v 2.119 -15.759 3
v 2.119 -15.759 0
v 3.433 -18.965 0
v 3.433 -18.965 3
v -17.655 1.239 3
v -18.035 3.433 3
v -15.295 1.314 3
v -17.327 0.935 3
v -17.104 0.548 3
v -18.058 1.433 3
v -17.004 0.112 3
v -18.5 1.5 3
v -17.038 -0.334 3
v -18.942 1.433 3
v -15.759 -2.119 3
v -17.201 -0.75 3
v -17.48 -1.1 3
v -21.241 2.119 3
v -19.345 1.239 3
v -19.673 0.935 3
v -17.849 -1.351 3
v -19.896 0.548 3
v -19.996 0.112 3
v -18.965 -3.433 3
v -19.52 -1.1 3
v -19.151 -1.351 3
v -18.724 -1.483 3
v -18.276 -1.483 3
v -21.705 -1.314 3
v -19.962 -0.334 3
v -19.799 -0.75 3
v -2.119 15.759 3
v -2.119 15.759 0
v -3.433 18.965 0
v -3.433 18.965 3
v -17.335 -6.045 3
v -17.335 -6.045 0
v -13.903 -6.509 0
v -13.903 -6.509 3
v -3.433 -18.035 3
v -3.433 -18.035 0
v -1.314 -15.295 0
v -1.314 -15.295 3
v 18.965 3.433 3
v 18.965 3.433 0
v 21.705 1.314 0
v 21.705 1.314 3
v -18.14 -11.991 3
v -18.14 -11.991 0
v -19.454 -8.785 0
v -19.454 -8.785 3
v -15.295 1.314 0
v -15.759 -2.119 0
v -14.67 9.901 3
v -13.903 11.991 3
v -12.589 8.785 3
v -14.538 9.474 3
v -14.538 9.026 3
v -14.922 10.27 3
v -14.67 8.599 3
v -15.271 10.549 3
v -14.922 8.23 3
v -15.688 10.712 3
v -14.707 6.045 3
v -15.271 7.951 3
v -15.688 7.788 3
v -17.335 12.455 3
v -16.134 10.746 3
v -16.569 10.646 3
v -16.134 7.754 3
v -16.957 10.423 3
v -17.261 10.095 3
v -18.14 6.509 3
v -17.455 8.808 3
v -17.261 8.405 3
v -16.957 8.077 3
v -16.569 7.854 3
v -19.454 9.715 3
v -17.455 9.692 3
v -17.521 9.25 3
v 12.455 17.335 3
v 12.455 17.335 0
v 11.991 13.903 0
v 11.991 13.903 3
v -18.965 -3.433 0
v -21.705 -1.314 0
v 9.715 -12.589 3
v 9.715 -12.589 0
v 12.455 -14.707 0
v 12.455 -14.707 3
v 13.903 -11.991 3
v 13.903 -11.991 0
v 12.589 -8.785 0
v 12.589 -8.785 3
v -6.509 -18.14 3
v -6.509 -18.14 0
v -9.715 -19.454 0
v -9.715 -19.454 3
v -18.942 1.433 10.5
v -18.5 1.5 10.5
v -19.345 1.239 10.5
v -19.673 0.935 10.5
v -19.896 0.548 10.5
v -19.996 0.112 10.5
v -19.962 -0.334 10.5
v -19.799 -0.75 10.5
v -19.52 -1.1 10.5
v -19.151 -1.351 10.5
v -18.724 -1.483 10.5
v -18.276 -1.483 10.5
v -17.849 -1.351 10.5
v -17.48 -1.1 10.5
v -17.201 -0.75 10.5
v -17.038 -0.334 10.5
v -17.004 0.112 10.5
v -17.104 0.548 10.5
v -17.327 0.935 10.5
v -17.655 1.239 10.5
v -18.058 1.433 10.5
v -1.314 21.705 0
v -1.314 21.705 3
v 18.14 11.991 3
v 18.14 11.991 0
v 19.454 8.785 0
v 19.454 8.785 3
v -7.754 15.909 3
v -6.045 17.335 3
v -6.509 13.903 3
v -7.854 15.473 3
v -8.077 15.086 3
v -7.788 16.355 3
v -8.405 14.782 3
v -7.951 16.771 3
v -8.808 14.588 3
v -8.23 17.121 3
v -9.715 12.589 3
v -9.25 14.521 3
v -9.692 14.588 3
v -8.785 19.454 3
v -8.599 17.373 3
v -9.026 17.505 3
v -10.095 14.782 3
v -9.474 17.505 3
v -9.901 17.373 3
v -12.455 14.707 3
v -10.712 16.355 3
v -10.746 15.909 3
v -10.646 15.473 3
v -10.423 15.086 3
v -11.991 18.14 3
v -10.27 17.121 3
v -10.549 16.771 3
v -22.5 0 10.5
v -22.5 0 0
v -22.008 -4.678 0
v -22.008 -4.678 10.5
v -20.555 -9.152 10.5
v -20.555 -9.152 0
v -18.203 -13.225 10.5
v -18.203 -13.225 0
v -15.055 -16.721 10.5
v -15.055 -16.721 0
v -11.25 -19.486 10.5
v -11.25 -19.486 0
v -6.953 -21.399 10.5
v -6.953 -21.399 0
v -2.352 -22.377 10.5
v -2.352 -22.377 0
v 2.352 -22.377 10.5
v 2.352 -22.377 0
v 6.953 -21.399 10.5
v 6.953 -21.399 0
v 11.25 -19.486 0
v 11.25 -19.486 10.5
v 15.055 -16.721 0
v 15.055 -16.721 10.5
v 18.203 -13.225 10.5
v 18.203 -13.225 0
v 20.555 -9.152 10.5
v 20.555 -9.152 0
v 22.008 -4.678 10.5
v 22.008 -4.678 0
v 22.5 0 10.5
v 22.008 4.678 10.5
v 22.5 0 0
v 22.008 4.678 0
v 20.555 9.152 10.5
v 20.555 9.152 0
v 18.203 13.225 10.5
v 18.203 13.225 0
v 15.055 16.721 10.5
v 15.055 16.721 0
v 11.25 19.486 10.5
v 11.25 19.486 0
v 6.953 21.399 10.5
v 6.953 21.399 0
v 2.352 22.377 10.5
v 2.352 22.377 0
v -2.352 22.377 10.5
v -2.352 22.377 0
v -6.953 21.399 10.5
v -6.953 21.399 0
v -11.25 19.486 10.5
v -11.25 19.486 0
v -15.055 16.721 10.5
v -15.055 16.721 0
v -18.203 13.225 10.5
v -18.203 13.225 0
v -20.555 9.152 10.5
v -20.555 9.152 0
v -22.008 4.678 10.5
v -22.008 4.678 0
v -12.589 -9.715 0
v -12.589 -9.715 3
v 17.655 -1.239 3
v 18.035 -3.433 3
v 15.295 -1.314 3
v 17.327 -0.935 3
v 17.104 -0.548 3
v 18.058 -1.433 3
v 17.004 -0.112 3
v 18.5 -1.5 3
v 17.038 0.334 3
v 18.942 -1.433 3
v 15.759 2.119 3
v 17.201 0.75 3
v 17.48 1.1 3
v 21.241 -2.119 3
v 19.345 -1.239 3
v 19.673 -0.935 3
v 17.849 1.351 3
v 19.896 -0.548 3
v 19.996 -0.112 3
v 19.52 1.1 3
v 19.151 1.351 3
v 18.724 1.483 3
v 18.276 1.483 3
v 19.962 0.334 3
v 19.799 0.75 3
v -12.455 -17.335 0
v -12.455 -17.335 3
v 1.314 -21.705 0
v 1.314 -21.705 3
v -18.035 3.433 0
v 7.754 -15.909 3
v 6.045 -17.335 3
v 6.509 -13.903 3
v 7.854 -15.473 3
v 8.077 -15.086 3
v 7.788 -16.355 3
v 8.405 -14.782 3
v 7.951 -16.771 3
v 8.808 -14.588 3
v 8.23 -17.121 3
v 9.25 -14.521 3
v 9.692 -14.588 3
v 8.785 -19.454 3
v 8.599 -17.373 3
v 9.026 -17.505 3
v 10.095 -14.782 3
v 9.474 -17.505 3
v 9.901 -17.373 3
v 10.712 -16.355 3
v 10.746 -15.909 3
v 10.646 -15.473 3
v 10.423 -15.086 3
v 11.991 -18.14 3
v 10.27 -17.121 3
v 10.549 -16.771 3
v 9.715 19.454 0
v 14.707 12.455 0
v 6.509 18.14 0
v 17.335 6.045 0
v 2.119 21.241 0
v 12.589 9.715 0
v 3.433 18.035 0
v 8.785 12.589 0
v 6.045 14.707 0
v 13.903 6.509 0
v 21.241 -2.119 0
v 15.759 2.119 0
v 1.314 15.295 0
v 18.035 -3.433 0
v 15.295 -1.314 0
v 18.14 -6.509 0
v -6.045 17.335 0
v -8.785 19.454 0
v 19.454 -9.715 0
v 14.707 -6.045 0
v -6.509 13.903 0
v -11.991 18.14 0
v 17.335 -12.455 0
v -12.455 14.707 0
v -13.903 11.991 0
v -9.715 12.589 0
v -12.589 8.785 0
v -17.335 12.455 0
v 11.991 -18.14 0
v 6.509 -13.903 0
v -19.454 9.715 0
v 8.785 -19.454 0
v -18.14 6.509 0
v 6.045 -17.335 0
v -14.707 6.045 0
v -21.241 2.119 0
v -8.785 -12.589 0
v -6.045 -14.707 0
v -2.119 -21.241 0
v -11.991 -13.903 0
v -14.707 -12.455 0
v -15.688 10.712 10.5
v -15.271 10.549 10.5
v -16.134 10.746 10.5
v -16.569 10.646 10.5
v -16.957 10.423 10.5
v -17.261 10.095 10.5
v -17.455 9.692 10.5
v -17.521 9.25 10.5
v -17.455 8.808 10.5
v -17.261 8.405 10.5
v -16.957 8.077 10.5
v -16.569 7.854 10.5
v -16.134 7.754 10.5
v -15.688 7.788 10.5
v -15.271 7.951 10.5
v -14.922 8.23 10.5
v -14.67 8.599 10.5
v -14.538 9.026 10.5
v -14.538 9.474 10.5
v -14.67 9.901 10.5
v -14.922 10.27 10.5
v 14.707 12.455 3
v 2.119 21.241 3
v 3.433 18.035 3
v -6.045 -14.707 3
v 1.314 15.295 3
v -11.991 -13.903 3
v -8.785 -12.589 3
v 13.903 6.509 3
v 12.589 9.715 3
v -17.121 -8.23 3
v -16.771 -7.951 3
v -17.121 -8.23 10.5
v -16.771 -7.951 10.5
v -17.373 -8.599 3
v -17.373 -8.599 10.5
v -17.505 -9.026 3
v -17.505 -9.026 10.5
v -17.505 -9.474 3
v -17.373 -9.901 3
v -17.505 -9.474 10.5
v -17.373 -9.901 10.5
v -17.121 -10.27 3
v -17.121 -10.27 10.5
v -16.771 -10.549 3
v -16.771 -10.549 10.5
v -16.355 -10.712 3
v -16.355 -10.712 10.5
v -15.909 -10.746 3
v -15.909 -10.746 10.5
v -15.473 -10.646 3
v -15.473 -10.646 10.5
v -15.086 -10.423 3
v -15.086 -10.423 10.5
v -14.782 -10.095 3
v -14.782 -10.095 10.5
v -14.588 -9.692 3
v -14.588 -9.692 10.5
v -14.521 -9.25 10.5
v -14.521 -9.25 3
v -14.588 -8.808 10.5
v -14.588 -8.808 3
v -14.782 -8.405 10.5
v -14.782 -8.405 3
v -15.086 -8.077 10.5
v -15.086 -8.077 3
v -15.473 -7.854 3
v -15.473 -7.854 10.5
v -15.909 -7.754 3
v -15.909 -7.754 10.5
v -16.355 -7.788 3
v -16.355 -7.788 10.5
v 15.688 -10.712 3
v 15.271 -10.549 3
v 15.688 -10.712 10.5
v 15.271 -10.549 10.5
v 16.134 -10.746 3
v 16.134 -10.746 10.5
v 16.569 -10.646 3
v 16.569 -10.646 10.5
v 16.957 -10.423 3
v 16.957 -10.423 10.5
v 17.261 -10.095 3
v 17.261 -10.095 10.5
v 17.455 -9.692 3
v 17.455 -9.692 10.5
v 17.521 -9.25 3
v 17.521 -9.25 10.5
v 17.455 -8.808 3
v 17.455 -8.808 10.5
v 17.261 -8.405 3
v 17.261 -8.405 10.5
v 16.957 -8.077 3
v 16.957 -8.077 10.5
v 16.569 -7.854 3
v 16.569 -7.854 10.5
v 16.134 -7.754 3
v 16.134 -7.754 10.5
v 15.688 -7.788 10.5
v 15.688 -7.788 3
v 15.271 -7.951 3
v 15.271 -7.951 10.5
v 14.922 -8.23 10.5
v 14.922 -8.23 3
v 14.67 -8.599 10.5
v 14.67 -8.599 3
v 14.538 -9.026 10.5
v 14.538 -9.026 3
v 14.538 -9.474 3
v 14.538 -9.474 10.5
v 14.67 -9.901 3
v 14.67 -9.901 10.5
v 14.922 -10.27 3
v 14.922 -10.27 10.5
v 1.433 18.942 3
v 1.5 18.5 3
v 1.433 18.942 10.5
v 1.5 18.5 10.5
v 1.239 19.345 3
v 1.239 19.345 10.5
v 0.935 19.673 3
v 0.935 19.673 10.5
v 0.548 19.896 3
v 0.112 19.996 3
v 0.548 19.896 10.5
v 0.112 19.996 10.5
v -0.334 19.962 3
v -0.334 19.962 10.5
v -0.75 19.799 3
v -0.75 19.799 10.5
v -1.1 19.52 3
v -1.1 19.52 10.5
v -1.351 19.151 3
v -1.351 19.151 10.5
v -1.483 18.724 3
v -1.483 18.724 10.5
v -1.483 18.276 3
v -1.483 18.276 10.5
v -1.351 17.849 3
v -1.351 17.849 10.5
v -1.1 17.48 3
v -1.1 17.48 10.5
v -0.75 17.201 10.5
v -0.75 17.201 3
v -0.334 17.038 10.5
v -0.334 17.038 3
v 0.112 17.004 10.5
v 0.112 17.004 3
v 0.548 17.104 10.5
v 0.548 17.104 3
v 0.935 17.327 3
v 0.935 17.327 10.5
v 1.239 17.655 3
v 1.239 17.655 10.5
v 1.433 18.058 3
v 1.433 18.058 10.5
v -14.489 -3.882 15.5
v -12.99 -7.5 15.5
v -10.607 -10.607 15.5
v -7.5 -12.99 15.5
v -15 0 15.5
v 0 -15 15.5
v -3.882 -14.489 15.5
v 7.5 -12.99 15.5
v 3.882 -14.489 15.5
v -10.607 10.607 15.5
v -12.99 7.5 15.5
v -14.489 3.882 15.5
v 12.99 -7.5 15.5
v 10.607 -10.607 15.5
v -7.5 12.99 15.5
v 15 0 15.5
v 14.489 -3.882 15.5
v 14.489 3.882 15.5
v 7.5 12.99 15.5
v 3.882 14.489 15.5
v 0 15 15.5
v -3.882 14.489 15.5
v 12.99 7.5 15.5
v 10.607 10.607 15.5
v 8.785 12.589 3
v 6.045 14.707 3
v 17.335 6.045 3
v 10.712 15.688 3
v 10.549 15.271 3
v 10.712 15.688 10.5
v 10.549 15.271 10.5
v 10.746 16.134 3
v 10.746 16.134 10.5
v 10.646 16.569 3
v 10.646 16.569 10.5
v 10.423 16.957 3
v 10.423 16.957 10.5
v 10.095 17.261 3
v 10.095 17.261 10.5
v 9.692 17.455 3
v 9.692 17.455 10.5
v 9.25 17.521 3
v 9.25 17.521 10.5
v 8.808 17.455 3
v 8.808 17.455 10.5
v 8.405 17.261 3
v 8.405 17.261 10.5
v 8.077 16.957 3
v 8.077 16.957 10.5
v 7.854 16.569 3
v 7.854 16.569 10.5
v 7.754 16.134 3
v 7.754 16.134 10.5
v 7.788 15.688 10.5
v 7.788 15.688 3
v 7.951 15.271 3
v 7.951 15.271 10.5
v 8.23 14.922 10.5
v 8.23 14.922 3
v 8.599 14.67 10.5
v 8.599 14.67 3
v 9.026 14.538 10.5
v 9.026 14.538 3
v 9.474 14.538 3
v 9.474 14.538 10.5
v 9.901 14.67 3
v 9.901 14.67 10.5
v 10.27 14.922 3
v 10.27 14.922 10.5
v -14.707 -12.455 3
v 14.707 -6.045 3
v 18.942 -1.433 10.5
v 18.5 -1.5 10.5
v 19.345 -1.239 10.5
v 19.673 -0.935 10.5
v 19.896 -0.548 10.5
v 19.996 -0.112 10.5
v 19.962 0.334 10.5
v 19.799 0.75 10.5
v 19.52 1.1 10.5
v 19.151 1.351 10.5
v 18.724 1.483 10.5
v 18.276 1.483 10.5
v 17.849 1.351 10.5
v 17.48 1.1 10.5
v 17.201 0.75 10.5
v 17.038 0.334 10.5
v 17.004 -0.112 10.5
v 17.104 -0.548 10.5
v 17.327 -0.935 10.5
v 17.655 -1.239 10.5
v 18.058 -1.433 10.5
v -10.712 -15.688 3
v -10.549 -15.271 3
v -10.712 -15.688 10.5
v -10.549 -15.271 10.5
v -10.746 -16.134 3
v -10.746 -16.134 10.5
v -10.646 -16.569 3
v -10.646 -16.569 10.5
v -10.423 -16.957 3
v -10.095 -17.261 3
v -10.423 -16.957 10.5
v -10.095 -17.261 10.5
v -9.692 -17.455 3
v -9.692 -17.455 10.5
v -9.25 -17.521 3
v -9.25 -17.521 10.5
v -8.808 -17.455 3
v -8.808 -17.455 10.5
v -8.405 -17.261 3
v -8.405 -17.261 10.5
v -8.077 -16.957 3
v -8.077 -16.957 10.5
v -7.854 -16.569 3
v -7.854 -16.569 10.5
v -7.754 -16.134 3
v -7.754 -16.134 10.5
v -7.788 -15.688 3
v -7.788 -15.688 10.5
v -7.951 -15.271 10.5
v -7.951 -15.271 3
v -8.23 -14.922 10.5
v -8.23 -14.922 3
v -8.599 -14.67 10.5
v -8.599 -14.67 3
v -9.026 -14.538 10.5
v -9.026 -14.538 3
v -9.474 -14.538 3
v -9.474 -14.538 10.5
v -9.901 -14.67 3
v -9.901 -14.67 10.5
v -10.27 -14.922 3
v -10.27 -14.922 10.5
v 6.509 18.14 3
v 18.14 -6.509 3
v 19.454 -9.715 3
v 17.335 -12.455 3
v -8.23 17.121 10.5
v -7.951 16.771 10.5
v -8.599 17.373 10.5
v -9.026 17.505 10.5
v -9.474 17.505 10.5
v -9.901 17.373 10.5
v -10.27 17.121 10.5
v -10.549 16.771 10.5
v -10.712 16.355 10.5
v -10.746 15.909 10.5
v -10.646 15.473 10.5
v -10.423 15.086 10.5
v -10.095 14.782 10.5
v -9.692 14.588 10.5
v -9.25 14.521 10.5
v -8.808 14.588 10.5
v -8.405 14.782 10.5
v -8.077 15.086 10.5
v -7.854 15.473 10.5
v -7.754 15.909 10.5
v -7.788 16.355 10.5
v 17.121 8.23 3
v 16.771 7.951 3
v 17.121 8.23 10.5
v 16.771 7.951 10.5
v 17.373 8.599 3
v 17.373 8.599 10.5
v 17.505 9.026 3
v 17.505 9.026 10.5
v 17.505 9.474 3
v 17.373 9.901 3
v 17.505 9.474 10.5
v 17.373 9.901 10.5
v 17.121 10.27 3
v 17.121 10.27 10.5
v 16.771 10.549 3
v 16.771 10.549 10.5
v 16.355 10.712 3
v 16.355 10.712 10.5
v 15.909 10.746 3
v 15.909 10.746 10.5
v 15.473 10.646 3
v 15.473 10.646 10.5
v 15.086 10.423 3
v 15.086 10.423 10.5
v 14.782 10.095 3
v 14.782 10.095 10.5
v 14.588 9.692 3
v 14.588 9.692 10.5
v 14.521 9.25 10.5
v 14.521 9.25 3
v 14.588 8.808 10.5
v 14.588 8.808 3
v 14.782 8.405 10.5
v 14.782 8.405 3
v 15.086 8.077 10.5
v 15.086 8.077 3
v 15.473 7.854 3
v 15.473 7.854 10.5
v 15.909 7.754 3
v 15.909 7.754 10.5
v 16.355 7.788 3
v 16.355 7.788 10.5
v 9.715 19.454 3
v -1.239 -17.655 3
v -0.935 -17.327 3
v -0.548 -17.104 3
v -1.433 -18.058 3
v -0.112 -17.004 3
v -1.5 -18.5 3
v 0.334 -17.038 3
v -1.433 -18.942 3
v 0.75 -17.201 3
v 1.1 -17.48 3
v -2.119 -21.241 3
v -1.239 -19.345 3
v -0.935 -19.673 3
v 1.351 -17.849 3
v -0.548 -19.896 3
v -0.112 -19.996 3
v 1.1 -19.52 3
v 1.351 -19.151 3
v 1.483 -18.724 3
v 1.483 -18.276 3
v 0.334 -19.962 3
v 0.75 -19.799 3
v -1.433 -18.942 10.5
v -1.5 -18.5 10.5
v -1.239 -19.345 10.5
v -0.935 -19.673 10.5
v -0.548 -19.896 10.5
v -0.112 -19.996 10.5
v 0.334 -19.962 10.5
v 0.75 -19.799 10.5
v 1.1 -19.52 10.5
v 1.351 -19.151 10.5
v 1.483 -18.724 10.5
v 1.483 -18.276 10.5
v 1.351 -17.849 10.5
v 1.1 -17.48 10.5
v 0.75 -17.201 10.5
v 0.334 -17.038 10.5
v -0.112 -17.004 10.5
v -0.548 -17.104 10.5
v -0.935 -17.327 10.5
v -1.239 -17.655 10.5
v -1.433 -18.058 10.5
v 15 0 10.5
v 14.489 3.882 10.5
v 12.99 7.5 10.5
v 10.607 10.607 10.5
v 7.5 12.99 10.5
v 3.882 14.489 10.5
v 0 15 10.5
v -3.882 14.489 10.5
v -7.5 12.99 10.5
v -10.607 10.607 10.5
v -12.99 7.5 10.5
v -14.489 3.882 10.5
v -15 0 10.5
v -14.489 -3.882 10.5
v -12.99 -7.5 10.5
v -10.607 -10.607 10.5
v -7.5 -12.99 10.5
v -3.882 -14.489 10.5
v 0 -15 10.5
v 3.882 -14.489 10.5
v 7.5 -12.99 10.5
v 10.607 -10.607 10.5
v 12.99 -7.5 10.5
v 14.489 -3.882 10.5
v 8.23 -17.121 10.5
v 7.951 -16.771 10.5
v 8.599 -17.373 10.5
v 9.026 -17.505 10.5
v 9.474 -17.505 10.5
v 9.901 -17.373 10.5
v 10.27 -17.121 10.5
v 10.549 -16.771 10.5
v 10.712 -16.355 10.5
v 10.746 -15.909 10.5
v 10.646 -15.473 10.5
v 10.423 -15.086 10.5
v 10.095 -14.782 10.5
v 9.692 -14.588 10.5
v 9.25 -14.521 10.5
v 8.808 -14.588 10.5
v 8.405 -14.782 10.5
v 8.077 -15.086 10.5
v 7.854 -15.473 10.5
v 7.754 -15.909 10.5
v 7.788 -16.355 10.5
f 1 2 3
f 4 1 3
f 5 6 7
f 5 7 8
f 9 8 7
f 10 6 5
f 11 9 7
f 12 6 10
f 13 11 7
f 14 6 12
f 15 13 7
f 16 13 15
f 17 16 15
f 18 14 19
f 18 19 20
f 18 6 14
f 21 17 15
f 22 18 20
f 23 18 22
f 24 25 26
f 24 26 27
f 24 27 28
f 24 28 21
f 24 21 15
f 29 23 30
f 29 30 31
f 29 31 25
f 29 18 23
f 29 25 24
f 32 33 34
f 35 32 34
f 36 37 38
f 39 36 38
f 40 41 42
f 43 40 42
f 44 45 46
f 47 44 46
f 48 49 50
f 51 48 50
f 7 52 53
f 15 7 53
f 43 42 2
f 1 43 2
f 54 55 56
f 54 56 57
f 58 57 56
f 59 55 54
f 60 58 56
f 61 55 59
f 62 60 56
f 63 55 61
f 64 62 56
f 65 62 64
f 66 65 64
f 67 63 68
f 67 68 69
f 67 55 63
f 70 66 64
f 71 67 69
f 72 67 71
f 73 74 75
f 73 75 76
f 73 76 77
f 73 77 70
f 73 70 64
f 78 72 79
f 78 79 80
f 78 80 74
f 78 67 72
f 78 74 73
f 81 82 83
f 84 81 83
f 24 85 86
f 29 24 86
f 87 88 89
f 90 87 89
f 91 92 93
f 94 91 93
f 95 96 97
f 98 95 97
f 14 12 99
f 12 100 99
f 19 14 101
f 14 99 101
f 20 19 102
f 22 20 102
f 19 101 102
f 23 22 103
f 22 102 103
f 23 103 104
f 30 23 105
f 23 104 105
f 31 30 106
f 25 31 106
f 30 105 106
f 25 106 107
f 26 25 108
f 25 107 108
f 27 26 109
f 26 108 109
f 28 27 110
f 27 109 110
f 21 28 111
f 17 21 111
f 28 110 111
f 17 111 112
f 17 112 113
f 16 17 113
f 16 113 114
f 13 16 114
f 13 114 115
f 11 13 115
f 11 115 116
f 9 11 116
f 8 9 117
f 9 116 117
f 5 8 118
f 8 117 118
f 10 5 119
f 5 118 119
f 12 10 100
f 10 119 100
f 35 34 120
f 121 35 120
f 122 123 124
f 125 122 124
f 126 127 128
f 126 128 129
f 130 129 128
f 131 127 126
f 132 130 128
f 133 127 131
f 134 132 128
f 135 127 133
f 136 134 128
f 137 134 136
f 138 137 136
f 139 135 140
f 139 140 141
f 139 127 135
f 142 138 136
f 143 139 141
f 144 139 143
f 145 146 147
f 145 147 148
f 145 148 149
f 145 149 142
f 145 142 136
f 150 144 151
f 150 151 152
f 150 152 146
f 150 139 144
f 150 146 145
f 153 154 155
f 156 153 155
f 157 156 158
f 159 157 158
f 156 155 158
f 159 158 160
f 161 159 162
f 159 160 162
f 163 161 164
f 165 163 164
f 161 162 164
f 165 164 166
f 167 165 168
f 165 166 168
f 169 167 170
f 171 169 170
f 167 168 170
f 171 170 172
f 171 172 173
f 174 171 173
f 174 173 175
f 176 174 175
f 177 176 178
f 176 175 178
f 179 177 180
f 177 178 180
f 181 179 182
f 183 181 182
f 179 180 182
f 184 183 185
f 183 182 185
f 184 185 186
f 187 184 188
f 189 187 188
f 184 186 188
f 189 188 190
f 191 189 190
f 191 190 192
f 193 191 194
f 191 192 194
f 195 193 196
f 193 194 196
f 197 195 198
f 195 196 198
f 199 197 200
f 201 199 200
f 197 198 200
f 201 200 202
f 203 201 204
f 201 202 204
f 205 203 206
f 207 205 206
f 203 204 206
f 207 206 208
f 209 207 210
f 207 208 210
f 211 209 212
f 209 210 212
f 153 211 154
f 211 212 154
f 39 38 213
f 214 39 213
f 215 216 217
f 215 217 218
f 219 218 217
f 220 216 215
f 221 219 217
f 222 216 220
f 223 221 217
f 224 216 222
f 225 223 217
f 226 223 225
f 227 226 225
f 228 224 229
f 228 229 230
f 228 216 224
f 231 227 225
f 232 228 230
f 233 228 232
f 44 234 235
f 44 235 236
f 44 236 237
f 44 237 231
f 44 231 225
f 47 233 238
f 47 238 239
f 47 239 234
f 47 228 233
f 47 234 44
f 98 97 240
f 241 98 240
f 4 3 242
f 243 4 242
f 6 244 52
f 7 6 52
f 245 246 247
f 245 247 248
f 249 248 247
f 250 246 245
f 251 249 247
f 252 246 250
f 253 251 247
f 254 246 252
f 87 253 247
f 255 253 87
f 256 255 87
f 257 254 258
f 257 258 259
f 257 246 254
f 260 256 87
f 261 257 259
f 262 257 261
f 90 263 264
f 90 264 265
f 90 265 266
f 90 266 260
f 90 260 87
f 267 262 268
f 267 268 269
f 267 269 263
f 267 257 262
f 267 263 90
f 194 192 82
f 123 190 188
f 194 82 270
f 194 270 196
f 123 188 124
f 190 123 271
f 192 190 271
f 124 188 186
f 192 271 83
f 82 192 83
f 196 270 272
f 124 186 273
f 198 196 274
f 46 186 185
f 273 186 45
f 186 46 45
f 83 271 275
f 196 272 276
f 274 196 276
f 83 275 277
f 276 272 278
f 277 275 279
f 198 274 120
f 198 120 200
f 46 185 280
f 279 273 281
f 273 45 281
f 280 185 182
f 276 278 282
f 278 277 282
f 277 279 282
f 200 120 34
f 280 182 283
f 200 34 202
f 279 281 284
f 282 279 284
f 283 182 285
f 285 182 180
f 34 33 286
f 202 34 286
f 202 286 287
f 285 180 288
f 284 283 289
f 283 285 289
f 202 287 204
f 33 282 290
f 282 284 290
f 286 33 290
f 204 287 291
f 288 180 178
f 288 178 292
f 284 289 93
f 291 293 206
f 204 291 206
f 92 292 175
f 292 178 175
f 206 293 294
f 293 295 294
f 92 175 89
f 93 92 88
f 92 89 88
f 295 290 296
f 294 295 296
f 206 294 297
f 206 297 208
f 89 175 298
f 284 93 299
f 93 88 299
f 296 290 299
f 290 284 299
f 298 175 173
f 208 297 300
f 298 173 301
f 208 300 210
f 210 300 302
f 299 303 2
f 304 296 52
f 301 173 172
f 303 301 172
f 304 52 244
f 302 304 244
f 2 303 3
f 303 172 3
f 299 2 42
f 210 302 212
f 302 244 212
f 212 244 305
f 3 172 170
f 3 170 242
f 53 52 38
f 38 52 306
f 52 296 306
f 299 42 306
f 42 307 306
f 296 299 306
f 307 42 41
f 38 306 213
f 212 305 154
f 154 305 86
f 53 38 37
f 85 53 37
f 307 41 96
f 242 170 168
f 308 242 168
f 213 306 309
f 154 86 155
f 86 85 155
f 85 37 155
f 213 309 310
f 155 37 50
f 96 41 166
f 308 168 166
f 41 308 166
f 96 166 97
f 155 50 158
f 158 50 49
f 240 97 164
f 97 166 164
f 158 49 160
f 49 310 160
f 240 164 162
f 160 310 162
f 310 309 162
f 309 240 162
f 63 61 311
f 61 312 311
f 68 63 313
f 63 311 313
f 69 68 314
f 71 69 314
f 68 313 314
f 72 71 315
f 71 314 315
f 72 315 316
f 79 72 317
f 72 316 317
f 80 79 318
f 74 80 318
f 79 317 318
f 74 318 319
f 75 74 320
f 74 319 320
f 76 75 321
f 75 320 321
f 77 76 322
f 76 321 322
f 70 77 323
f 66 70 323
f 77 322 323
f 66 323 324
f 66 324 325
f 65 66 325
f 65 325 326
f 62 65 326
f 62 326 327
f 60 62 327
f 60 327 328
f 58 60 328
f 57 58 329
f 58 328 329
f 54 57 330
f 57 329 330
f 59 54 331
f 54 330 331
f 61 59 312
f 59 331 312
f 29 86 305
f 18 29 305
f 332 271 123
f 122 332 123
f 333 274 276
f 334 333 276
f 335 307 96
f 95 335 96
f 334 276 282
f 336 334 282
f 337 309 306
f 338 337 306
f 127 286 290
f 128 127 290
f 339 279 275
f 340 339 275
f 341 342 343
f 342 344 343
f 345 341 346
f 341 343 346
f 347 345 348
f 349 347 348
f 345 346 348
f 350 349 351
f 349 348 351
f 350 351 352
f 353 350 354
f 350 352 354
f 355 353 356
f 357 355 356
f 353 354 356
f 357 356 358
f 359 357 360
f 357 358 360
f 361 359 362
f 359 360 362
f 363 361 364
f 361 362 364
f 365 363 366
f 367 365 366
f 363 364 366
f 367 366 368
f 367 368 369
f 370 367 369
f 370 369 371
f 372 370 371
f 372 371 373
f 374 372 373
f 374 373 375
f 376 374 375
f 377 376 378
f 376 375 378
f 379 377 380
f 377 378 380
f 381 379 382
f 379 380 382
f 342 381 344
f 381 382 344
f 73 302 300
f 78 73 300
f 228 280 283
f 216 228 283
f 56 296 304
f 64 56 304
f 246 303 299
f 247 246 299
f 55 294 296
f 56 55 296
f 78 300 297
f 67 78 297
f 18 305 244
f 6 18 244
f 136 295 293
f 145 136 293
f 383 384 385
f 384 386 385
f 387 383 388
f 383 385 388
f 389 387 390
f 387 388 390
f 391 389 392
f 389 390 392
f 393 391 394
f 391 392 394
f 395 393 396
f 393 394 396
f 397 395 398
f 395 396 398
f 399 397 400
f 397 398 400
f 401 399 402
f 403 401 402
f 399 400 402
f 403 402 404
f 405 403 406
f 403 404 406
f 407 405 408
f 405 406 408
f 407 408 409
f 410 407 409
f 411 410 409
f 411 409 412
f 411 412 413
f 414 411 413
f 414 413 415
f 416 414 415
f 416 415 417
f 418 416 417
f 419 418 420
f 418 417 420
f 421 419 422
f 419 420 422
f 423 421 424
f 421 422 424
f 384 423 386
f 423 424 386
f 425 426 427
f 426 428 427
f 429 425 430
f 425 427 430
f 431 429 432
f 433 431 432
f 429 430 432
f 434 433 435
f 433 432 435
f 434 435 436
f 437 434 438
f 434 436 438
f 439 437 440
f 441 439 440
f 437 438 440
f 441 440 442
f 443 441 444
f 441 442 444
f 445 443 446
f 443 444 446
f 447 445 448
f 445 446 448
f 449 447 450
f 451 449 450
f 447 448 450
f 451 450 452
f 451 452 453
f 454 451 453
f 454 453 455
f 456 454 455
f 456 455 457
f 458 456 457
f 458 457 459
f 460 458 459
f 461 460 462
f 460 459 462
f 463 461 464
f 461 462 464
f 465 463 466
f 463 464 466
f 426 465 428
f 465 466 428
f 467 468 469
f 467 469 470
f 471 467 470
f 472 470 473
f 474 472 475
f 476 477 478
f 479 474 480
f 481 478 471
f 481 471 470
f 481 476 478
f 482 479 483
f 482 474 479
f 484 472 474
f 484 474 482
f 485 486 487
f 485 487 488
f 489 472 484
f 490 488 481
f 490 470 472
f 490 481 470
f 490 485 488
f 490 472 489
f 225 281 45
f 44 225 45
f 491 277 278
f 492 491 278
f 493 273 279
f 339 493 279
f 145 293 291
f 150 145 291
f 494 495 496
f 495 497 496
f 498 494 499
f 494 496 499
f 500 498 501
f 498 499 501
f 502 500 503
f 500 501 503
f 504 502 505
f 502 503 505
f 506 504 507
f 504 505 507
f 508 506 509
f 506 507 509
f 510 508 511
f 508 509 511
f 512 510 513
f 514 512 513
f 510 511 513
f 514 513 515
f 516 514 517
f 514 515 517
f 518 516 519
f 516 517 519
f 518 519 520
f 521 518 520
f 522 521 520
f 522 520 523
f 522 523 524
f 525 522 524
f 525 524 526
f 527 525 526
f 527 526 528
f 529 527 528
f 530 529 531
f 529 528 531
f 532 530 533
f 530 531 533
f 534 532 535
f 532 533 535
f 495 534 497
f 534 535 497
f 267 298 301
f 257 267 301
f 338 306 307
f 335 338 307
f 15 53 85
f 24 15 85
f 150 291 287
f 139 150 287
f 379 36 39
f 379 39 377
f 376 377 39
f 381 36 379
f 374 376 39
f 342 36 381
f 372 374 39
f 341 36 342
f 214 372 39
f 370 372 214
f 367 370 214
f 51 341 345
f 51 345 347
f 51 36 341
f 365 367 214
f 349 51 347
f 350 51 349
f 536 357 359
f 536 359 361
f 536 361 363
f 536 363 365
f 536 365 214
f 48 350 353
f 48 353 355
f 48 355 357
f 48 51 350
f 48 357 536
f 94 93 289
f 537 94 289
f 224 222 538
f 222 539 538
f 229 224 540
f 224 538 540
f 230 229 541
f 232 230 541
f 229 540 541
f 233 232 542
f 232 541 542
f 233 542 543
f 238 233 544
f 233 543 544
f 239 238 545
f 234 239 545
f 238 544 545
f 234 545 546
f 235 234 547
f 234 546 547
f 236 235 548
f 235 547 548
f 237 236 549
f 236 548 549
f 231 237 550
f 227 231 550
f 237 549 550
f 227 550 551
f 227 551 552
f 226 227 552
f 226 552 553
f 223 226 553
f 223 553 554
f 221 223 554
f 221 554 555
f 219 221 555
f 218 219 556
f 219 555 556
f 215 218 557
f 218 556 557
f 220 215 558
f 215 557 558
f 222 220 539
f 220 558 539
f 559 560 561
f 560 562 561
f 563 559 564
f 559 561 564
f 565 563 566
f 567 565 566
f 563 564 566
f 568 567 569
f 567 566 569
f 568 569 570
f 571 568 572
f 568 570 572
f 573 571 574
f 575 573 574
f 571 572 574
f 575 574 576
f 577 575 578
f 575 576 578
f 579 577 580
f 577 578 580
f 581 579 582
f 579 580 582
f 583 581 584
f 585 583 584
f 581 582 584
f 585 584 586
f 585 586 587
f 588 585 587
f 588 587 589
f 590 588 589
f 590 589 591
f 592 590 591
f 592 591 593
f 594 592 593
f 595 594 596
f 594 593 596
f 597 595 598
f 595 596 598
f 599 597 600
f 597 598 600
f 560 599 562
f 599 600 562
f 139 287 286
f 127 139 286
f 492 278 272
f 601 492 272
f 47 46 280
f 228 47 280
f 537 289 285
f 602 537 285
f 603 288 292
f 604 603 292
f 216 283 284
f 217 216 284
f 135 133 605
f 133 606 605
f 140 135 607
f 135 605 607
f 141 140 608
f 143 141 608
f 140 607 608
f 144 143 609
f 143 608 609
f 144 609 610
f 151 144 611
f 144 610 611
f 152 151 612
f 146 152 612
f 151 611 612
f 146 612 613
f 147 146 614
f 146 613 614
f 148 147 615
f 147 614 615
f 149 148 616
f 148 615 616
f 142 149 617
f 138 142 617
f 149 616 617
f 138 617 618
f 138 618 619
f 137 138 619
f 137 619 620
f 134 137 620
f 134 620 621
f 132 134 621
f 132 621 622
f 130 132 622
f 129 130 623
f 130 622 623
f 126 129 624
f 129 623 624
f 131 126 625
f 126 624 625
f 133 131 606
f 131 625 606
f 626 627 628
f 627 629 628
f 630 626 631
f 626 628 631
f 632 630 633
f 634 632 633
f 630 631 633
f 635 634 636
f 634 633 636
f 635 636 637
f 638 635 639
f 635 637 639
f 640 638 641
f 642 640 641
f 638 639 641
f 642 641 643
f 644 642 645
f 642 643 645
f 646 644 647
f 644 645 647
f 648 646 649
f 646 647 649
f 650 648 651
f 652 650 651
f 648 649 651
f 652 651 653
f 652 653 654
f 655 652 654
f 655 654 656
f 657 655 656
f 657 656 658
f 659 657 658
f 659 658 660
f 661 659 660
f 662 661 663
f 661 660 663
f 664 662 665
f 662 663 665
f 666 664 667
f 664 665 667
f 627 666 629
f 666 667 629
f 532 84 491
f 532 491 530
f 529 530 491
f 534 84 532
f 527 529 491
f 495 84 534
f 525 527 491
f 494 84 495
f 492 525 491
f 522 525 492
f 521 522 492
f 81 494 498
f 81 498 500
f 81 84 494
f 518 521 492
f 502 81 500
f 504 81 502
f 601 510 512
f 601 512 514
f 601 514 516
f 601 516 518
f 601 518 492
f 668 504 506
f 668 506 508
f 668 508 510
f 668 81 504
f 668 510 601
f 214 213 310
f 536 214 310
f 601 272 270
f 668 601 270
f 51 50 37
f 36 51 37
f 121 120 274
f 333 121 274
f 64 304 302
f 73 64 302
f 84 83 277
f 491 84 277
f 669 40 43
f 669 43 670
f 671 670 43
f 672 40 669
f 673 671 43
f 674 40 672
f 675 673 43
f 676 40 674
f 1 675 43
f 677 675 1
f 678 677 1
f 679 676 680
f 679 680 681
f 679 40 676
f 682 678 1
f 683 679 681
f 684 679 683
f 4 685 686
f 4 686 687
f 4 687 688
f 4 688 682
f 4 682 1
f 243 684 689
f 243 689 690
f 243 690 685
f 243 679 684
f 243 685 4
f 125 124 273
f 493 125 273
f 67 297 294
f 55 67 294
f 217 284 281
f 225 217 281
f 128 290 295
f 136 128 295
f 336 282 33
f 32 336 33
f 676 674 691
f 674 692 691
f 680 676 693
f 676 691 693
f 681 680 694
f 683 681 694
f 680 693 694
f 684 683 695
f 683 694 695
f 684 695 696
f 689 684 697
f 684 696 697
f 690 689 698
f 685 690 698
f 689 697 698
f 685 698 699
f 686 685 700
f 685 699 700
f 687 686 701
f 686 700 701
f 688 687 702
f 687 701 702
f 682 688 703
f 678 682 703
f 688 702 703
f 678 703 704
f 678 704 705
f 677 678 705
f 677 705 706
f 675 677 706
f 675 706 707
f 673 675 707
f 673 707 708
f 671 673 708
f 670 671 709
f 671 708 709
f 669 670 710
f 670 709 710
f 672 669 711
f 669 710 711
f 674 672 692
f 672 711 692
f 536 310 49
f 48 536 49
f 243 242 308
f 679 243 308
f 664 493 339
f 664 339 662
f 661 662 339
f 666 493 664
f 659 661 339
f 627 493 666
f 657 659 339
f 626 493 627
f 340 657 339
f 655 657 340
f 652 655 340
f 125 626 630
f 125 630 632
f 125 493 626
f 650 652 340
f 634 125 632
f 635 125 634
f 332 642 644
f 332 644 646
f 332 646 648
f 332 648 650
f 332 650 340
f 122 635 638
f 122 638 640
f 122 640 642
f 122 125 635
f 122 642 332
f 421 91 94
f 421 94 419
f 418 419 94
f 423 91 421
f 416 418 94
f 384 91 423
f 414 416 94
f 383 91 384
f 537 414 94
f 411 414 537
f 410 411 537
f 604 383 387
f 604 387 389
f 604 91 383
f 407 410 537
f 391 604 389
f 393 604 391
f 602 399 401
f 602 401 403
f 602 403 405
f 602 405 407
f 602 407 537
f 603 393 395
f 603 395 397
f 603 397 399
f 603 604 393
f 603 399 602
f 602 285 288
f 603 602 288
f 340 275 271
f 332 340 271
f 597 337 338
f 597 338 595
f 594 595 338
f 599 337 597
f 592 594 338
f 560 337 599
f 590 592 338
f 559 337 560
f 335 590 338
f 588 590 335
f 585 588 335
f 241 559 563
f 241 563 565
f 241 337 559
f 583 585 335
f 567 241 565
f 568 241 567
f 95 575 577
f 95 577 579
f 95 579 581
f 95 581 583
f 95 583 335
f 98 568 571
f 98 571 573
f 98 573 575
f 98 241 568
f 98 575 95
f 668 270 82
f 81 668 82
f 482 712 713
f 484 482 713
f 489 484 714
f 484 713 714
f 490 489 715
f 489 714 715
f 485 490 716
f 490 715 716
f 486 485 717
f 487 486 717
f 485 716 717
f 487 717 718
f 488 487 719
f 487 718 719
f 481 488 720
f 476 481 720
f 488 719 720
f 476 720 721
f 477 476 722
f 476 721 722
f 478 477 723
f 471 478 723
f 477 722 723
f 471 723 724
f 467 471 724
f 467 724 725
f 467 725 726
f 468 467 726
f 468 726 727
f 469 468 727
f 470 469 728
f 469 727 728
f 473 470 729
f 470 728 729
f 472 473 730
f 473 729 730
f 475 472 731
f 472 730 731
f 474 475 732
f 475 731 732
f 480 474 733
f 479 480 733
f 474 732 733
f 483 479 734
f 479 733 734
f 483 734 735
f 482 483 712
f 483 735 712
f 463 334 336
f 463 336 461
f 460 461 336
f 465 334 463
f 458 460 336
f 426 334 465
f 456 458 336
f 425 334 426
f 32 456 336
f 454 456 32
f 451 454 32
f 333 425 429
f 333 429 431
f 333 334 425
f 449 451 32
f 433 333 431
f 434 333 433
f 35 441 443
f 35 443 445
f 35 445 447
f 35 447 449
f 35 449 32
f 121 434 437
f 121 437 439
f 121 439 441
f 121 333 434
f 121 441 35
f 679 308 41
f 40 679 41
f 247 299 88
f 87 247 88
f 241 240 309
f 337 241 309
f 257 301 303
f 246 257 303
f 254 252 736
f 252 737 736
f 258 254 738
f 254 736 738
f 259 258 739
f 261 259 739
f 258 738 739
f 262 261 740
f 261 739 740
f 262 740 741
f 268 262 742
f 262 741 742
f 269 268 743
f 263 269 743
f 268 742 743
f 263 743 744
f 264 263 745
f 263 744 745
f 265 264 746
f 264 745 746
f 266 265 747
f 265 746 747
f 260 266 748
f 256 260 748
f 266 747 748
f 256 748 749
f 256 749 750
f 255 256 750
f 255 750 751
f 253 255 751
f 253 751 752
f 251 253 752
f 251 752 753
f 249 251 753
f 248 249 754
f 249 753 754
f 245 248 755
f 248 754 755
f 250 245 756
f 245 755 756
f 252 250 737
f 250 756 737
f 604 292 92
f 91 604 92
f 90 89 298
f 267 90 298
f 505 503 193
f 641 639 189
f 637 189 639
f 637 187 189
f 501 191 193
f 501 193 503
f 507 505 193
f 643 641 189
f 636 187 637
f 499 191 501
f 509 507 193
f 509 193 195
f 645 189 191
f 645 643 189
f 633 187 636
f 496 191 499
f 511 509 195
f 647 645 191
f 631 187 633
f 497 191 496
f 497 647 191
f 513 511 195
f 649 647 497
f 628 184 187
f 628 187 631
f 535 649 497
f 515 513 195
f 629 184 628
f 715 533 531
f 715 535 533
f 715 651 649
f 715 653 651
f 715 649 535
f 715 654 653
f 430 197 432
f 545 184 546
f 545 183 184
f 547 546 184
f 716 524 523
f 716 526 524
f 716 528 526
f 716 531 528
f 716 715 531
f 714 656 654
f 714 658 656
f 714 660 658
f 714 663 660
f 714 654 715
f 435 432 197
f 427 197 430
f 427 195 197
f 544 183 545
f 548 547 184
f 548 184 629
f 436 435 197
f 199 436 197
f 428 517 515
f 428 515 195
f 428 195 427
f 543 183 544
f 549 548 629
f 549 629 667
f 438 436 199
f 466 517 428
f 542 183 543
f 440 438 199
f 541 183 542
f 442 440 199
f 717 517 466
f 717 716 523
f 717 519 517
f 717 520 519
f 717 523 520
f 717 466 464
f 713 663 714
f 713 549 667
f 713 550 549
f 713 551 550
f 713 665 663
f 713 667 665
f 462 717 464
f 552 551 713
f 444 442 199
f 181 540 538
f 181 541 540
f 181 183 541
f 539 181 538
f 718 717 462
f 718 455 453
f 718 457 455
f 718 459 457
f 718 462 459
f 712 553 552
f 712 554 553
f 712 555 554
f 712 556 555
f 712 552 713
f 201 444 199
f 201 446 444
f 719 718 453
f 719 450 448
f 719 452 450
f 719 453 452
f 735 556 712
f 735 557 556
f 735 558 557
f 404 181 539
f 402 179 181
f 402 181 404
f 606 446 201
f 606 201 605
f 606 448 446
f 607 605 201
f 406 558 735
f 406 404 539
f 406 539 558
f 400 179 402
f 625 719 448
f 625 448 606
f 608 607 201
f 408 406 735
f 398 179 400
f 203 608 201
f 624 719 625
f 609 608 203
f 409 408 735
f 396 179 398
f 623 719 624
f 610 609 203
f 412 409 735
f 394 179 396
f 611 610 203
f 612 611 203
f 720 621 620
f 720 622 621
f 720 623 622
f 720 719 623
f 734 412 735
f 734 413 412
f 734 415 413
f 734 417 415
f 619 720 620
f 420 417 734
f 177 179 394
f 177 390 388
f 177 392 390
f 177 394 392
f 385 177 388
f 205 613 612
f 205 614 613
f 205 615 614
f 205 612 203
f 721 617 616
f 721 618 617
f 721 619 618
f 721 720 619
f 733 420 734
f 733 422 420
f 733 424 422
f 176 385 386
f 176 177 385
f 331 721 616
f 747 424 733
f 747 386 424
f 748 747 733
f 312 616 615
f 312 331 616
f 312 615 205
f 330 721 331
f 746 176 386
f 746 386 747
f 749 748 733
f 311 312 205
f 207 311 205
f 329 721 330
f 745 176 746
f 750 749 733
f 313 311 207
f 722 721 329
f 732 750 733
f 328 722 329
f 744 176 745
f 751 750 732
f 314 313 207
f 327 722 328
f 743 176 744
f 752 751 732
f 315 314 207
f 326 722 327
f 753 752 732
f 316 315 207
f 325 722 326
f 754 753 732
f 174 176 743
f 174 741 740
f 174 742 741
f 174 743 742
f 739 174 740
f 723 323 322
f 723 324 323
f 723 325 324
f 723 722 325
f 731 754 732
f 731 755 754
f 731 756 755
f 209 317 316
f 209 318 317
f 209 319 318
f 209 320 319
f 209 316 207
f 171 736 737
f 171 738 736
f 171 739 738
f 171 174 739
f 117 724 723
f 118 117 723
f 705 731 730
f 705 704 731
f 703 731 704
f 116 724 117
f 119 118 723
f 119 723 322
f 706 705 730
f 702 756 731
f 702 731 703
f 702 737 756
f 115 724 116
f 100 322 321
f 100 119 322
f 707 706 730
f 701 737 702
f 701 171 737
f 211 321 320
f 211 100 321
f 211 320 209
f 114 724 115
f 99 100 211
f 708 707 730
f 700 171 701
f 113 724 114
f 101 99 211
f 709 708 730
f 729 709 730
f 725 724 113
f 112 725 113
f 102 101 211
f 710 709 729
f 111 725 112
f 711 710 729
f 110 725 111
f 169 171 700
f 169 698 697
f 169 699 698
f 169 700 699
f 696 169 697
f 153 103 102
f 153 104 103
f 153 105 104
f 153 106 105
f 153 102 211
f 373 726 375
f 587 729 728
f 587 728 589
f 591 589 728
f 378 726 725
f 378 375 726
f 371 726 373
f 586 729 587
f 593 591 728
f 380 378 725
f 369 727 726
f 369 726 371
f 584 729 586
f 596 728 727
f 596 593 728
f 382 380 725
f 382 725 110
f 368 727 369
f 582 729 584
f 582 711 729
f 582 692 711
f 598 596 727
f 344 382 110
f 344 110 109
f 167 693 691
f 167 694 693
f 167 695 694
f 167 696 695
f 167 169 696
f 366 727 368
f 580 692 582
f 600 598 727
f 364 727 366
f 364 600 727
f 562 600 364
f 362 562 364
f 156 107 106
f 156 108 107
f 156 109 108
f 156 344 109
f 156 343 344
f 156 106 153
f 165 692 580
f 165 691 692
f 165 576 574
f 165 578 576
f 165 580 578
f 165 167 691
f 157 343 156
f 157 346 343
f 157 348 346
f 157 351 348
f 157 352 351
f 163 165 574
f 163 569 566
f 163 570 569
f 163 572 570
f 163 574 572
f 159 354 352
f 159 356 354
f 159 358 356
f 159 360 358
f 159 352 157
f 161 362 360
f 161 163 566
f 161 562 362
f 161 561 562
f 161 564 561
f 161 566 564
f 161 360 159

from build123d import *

# Parameters (mm, degrees)
SKETCH_1_R               = 22.5
EXTRUDE_1_DEPTH          = 10.5
SKETCH_2_R               = 15
EXTRUDE_2_DEPTH          = 5
SKETCH_3_R               = 1.5
CUT_EXTRUDE_1_DEPTH      = 5
SKETCH_5_R               = 1.5
CUT_EXTRUDE_2_DEPTH      = 34.507461856
CUT_EXTRUDE_6_DEPTH      = 3
PATTERN_CIRCULAR_1_COUNT = 12


with BuildPart() as part:
    # 草图1 → 凸台-拉伸1 (new body)
    with BuildSketch(Plane.XY):
        with Locations(Location((0, 0, 0), (0, 0, 180))):
            Circle(SKETCH_1_R)
    extrude(amount=EXTRUDE_1_DEPTH)

    # 草图2 → 凸台-拉伸2 (add)
    with BuildSketch(Plane.XY.offset(10.5)):
        Circle(SKETCH_2_R)
    extrude(amount=EXTRUDE_2_DEPTH)

    # 草图3 → 切除-拉伸1 (cut)
    with BuildSketch(Plane.XY.offset(10.5)):
        with Locations((0, 18.5)):
            Circle(SKETCH_3_R)
    cut_extrude_1 = extrude(amount=-CUT_EXTRUDE_1_DEPTH, mode=Mode.SUBTRACT)

    # 草图5 → 切除-拉伸2 (cut, through all)
    with BuildSketch(Plane.XY.offset(10.5)):
        with Locations((0, 18.5)):
            Circle(SKETCH_5_R)
    cut_extrude_2 = extrude(amount=-CUT_EXTRUDE_2_DEPTH, mode=Mode.SUBTRACT)

    # 草图9 → 切除-拉伸6 (cut)
    with BuildSketch(Plane(origin=(0, 0, 0), x_dir=(-1, 0, 0), z_dir=(0, 0, -1))):
        Polygon((1.313991975, 21.705218415), (-2.118804585, 21.240559639), (-3.43279656, 18.035341223), (-1.313991975, 15.294781585), (2.118804585, 15.759440361), (3.43279656, 18.964658777), align=None)
    cut_extrude_6 = extrude(amount=-CUT_EXTRUDE_6_DEPTH, mode=Mode.SUBTRACT)

    # 阵列(圆周)1: 切除-拉伸1, 切除-拉伸2, 切除-拉伸6 ×12 about axis
    pattern_circular_1_axis = Axis((0, 0, 0), (0, 0, 1))
    add([cut_extrude_1.rotate(pattern_circular_1_axis, i * 360 / PATTERN_CIRCULAR_1_COUNT) for i in range(1, PATTERN_CIRCULAR_1_COUNT)], mode=Mode.SUBTRACT)
    add([cut_extrude_2.rotate(pattern_circular_1_axis, i * 360 / PATTERN_CIRCULAR_1_COUNT) for i in range(1, PATTERN_CIRCULAR_1_COUNT)], mode=Mode.SUBTRACT)
    add([cut_extrude_6.rotate(pattern_circular_1_axis, i * 360 / PATTERN_CIRCULAR_1_COUNT) for i in range(1, PATTERN_CIRCULAR_1_COUNT)], mode=Mode.SUBTRACT)


solid = part.part
